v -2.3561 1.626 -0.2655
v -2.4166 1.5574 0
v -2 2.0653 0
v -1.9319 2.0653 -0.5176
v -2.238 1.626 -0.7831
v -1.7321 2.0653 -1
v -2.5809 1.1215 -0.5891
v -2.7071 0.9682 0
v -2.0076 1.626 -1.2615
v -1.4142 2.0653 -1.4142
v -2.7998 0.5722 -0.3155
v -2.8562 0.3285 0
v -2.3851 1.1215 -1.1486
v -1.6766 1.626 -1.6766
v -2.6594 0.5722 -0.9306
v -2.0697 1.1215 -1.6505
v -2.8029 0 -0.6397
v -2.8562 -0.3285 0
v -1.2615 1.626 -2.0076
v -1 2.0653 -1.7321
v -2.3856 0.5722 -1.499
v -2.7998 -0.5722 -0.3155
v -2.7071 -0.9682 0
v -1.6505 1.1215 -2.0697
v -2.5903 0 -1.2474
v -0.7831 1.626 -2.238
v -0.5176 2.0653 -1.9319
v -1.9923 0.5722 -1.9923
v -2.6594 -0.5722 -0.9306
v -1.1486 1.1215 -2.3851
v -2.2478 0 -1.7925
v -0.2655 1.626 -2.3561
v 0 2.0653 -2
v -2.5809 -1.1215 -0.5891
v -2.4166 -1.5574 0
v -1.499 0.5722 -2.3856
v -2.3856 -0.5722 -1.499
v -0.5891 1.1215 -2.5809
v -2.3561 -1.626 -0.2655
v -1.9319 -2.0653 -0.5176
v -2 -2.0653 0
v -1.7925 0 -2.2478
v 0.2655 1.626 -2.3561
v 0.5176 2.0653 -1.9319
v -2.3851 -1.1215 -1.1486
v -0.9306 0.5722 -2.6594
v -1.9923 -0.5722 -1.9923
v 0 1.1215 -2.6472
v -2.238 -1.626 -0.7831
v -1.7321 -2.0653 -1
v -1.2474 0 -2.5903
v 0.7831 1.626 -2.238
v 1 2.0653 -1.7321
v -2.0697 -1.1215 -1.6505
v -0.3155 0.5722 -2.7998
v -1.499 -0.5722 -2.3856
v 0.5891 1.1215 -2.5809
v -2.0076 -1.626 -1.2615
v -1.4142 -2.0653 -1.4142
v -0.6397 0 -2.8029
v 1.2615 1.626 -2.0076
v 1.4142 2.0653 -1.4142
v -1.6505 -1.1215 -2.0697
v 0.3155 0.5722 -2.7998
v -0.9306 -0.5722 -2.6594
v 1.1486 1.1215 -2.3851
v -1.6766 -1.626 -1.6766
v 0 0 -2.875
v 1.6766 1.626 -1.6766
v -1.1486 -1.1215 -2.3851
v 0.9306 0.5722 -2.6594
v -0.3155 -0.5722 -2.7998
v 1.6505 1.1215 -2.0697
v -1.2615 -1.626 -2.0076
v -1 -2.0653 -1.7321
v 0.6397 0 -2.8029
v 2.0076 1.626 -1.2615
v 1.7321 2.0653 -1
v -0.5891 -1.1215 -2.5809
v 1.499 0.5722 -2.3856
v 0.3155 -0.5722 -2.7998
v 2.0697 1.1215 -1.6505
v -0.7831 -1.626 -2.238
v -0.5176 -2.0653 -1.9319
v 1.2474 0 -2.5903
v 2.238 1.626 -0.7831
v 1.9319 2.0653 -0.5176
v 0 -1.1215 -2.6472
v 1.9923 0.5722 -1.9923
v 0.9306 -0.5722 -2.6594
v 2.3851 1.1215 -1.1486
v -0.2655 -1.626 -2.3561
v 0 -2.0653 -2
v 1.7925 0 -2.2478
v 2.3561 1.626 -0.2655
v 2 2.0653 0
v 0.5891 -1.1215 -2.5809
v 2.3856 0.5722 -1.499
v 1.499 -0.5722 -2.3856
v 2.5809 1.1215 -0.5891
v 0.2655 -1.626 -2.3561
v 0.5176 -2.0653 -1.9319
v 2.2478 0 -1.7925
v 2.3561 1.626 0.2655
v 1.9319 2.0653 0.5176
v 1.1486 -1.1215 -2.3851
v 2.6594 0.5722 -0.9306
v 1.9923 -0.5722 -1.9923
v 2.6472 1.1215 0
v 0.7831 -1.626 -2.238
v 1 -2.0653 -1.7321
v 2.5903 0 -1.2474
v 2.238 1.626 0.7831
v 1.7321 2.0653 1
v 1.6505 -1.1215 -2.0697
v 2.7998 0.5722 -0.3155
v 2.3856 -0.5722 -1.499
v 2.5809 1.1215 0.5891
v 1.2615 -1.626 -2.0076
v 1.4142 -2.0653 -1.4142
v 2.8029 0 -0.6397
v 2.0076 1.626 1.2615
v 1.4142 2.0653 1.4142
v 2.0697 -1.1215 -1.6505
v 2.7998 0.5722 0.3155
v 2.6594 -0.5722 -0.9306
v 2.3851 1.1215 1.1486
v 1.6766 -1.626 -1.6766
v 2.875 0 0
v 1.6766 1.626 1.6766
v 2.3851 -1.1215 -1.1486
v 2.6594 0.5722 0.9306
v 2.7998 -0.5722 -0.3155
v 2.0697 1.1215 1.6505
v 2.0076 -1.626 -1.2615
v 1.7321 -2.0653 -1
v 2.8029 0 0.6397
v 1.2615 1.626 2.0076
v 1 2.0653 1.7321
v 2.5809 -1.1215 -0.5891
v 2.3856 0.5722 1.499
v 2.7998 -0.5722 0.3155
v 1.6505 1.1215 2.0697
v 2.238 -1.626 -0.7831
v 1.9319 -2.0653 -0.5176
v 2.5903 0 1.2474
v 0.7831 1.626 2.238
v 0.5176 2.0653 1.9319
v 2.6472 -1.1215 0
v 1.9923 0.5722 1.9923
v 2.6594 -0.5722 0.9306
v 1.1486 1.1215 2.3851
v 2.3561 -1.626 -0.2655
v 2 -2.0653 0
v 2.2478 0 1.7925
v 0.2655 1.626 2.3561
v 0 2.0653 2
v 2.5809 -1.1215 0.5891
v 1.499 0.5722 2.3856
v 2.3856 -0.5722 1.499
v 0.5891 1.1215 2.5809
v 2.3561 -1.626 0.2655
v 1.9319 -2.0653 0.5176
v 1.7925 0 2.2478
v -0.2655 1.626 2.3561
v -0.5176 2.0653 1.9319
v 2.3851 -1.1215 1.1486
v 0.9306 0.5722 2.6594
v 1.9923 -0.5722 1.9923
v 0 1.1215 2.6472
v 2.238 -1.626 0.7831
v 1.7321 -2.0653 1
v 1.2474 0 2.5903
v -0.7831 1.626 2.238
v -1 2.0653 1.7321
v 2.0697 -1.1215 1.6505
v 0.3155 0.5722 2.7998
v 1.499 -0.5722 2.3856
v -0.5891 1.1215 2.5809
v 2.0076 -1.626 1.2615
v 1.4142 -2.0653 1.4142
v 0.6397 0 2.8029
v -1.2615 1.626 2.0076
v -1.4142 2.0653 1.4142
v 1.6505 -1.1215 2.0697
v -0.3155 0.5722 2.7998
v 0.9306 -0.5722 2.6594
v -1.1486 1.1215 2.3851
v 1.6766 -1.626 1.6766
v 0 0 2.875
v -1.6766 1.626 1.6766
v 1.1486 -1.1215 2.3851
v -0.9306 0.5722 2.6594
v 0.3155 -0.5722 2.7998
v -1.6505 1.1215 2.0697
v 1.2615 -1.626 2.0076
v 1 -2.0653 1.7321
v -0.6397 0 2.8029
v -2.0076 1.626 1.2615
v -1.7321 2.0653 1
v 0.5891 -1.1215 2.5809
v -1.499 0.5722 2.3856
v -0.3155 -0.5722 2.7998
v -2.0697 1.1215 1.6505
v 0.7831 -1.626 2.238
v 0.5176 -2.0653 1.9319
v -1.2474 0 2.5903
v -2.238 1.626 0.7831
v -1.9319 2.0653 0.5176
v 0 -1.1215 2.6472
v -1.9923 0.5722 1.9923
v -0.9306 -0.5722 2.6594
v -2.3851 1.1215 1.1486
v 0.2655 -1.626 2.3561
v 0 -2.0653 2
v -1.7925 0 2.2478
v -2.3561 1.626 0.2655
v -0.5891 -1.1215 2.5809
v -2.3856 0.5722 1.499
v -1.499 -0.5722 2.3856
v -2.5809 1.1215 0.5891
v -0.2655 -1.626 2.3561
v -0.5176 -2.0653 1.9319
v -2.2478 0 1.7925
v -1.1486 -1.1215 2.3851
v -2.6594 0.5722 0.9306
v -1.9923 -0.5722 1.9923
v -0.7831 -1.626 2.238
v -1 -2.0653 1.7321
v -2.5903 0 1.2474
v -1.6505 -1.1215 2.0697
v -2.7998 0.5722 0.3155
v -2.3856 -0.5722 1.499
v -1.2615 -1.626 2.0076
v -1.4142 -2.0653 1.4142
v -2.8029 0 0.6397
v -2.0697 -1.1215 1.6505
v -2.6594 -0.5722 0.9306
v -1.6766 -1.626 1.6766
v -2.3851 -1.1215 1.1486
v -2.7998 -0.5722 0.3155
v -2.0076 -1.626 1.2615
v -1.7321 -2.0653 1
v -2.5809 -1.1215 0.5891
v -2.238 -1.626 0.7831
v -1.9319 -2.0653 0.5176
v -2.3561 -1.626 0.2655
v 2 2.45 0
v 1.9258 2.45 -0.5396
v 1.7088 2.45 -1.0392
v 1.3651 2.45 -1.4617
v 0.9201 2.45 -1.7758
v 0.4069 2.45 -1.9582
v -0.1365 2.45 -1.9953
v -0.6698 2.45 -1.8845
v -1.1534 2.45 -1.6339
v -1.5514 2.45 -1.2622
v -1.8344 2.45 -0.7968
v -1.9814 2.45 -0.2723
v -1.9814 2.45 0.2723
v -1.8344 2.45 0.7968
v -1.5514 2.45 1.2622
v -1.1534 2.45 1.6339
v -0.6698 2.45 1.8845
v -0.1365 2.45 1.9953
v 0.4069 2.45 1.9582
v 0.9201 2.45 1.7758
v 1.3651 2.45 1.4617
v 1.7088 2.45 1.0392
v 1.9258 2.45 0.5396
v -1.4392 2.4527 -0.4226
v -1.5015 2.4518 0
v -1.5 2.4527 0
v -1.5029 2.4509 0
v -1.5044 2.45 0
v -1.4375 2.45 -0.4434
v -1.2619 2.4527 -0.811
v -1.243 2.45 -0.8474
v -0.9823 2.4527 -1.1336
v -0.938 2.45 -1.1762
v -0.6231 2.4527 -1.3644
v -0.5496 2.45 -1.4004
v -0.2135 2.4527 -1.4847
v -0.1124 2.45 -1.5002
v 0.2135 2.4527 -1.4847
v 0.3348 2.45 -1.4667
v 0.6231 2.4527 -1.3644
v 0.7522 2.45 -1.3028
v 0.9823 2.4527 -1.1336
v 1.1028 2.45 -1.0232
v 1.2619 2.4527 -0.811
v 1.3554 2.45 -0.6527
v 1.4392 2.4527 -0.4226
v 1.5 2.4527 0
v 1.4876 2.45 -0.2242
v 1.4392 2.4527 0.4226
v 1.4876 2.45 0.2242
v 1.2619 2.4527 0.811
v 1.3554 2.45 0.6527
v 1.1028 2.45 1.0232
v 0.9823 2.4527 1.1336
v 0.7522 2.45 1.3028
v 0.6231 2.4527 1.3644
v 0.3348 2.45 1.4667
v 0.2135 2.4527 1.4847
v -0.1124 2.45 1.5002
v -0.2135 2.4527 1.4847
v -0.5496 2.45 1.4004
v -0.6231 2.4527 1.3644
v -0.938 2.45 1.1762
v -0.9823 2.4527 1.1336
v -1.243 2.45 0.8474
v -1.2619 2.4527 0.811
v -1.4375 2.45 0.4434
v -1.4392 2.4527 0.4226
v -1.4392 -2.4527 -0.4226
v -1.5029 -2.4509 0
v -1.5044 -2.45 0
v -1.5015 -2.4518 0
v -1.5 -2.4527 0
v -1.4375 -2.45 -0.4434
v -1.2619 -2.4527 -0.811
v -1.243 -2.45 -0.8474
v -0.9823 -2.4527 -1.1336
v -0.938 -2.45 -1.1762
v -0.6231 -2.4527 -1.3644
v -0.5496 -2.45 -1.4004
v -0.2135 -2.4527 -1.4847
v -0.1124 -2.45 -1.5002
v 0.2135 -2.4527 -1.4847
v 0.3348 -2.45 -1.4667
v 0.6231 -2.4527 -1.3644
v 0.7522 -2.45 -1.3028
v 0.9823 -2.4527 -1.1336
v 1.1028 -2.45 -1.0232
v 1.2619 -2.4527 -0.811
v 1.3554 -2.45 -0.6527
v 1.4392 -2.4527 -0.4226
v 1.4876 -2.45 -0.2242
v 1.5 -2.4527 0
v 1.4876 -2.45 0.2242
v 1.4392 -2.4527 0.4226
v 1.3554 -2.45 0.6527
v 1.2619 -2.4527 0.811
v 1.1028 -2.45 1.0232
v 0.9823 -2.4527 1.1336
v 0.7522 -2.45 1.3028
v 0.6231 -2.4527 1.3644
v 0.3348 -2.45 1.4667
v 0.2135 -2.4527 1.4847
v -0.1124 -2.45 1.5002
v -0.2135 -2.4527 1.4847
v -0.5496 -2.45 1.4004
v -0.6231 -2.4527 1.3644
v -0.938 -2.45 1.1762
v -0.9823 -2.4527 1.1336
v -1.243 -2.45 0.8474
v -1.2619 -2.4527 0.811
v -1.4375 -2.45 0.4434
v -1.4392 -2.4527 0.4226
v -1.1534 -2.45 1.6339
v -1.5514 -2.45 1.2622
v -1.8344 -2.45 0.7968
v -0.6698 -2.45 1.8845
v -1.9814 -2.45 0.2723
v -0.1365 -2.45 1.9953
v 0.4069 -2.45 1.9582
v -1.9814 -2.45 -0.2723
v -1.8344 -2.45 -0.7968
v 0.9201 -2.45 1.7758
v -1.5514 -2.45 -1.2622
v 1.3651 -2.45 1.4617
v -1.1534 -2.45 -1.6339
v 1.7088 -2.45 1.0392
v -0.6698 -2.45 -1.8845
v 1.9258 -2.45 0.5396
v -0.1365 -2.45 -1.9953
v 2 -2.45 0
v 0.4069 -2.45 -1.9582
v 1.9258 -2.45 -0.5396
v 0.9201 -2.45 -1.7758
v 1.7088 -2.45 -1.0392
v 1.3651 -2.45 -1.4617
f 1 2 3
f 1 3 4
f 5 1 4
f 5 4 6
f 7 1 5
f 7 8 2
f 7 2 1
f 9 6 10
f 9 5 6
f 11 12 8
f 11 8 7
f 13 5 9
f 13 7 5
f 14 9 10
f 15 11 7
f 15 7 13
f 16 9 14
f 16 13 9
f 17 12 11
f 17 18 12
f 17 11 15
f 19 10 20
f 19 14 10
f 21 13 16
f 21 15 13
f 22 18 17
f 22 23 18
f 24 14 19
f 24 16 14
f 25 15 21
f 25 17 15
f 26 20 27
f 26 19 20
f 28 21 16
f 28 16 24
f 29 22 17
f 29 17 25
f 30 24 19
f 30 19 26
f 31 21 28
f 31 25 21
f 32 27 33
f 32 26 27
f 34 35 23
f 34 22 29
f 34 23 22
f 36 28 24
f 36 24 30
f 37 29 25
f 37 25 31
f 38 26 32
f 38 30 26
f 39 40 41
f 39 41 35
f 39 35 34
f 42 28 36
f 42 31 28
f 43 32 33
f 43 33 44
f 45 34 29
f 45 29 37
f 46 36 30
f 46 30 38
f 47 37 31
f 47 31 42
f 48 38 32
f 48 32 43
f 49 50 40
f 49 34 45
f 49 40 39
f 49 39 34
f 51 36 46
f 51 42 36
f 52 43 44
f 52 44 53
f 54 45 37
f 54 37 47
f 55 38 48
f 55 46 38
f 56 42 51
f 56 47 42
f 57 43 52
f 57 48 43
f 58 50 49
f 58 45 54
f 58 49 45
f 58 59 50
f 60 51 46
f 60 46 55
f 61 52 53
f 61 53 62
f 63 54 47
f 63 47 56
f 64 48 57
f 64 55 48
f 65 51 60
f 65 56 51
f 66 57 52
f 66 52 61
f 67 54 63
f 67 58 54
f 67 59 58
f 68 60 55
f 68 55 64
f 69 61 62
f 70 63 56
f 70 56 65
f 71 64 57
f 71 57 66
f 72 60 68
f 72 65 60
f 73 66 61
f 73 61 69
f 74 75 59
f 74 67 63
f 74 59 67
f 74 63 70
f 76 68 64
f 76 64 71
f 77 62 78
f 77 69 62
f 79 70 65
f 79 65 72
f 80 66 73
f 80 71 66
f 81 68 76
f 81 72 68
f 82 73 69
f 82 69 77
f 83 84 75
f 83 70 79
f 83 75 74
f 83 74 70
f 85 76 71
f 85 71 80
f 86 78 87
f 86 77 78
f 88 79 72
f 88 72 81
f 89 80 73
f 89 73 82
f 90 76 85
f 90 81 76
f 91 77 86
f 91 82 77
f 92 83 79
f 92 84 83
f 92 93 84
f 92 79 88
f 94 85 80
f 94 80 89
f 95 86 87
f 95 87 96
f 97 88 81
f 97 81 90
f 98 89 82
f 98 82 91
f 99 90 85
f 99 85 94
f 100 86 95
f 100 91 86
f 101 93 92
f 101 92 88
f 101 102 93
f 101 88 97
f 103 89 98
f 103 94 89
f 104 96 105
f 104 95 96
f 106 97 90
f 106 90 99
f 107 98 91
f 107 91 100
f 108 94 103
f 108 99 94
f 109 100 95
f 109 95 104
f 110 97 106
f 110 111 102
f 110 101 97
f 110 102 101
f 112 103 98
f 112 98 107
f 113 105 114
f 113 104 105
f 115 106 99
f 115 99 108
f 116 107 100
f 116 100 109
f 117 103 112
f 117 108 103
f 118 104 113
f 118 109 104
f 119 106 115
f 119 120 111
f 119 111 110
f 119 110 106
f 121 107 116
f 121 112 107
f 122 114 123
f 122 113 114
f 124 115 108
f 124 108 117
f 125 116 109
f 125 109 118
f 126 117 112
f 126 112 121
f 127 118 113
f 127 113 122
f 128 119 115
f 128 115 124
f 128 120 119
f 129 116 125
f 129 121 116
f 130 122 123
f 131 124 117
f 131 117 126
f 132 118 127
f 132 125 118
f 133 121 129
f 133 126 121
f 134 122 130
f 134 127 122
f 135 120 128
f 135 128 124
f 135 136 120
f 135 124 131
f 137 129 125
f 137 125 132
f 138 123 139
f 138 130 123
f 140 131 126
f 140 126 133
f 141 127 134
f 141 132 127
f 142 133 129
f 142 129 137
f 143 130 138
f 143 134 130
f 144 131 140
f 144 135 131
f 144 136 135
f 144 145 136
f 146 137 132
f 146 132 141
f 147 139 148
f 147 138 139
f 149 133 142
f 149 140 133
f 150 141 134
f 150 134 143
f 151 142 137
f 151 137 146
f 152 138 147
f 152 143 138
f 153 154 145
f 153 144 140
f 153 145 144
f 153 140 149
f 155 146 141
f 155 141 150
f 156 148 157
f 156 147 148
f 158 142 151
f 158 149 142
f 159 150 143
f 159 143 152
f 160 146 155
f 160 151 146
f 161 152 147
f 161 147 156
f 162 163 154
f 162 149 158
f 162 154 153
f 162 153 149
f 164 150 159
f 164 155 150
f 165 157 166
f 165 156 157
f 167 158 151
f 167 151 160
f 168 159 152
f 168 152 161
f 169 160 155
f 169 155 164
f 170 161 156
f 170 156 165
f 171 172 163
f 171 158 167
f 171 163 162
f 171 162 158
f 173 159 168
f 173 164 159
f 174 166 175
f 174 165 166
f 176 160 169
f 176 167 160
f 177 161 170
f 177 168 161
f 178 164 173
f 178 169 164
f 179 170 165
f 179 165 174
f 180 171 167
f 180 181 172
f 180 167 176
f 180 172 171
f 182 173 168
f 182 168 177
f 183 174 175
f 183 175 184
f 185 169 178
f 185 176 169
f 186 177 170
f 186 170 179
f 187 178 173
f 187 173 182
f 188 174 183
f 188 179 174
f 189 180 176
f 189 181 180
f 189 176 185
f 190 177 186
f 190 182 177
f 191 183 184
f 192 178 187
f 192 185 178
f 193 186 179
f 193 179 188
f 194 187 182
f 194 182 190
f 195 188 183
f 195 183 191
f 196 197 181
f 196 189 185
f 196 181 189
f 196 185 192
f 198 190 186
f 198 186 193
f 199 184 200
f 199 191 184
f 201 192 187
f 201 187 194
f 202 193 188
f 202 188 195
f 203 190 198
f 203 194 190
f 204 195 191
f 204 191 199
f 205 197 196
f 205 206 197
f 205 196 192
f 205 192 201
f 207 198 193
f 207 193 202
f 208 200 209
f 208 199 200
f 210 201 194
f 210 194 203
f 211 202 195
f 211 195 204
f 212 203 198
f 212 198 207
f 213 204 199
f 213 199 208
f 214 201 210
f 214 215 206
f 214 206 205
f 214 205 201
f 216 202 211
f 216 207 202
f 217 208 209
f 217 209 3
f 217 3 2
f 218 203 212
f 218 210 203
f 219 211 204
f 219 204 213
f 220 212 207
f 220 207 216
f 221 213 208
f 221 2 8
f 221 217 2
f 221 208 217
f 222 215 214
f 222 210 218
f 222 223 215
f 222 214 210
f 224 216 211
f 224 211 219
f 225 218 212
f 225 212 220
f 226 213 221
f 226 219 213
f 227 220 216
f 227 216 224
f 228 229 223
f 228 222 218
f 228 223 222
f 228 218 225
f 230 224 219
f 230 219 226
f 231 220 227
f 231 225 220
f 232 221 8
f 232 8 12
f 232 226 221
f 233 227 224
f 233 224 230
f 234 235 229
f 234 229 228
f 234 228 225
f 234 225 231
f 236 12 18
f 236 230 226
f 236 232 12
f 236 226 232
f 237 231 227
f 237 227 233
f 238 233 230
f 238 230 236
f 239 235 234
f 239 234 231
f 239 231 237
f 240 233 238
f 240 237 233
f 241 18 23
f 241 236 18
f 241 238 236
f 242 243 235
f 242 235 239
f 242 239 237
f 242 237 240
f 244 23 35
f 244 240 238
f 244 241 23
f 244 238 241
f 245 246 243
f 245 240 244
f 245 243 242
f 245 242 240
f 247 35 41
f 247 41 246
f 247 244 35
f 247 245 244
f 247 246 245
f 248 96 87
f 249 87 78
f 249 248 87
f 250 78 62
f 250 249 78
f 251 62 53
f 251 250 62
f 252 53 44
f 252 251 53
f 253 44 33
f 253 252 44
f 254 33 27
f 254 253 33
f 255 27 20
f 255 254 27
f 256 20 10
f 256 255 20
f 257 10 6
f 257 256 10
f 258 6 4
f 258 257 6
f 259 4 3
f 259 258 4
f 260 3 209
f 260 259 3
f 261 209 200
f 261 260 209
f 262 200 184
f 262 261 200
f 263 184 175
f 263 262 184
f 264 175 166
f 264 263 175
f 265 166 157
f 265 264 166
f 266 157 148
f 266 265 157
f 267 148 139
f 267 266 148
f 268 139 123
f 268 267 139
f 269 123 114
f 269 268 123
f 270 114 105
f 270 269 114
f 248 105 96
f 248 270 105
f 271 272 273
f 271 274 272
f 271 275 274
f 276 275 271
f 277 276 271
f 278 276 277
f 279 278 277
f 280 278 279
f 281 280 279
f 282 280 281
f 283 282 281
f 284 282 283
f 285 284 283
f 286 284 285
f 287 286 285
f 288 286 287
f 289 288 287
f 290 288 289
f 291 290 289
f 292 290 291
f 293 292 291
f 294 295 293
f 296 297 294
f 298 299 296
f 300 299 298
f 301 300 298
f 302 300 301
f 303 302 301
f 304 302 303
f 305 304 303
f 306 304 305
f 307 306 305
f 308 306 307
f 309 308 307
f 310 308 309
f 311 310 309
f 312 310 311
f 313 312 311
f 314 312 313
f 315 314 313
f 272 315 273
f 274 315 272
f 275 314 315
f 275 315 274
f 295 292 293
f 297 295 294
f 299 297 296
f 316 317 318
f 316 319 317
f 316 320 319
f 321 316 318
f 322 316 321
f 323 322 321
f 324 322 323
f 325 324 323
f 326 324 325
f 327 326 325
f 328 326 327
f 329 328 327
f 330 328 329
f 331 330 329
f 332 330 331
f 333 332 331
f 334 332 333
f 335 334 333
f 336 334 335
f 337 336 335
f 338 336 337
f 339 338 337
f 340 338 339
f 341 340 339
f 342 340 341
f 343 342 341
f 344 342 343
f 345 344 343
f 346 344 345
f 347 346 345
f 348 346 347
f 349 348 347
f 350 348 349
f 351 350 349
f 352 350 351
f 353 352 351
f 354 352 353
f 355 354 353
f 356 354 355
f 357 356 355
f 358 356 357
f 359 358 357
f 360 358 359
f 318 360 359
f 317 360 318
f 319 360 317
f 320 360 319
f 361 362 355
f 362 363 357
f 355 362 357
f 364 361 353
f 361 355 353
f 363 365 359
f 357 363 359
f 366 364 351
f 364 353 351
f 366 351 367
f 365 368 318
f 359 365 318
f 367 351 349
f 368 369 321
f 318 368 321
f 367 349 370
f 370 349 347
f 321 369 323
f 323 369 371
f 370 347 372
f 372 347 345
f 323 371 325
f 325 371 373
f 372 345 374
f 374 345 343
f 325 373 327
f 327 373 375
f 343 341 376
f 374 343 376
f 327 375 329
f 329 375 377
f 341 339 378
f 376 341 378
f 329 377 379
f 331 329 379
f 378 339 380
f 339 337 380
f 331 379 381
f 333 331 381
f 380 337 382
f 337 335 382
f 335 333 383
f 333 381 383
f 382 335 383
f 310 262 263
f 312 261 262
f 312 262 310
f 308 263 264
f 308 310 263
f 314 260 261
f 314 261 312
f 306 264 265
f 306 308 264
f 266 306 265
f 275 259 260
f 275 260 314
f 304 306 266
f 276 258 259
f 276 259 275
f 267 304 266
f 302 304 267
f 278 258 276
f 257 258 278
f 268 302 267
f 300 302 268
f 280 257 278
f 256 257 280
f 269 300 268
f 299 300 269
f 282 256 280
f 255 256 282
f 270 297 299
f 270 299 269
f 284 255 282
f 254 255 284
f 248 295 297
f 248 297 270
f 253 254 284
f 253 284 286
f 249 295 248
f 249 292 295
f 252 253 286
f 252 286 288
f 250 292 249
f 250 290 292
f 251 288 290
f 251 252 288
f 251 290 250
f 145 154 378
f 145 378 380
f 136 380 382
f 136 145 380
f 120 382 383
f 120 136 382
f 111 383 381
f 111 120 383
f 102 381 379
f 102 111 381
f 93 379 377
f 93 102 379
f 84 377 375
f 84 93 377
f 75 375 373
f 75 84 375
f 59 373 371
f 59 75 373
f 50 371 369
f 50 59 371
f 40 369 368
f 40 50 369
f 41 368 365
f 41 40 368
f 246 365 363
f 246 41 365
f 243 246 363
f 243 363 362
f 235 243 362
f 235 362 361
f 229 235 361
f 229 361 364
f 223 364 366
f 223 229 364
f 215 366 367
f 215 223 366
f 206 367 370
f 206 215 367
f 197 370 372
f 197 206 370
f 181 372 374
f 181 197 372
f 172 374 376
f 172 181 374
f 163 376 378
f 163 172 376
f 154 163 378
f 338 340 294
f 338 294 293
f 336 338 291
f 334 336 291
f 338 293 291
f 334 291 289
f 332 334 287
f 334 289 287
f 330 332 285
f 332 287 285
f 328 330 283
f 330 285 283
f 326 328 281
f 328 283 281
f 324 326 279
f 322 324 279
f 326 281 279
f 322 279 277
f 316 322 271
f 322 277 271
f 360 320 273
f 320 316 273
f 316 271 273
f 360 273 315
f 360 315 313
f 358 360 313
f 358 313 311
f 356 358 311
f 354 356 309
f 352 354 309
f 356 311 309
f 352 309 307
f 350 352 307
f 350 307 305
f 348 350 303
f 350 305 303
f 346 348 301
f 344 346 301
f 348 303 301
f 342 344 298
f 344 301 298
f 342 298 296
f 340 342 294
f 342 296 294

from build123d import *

# Parameters (mm, degrees)
SKETCH2_R           = 2
SKETCH2_R_2         = 1.5
BOSS_EXTRUDE1_DEPTH = 2.45
SKETCH2_3_R         = 1.5
CUT_EXTRUDE1_DEPTH  = 3


with BuildPart() as part:
    # Sketch1 → Revolve1 (revolve)
    with BuildSketch(Plane.XY):
        with BuildLine():
            Line((0, -2.875), (0, 2.875))
            ThreePointArc((0, 2.875), (-2.875, 0), (0, -2.875))
        make_face()
    revolve(axis=Axis((0, 55, 0), (0, -1, 0)))

    # Sketch2 → Boss-Extrude1 (add, symmetric)
    with BuildSketch(Plane(origin=(0, 0, 0), x_dir=(1, 0, 0), z_dir=(0, 1, 0))):
        Circle(SKETCH2_R)
        Circle(SKETCH2_R_2, mode=Mode.SUBTRACT)
    extrude(amount=BOSS_EXTRUDE1_DEPTH, both=True)

    # Sketch2<3> → Cut-Extrude1 (cut, symmetric)
    with BuildSketch(Plane(origin=(0, 0, 0), x_dir=(1, 0, 0), z_dir=(0, 1, 0))):
        Circle(SKETCH2_3_R)
    extrude(amount=CUT_EXTRUDE1_DEPTH, both=True, mode=Mode.SUBTRACT)


solid = part.part
